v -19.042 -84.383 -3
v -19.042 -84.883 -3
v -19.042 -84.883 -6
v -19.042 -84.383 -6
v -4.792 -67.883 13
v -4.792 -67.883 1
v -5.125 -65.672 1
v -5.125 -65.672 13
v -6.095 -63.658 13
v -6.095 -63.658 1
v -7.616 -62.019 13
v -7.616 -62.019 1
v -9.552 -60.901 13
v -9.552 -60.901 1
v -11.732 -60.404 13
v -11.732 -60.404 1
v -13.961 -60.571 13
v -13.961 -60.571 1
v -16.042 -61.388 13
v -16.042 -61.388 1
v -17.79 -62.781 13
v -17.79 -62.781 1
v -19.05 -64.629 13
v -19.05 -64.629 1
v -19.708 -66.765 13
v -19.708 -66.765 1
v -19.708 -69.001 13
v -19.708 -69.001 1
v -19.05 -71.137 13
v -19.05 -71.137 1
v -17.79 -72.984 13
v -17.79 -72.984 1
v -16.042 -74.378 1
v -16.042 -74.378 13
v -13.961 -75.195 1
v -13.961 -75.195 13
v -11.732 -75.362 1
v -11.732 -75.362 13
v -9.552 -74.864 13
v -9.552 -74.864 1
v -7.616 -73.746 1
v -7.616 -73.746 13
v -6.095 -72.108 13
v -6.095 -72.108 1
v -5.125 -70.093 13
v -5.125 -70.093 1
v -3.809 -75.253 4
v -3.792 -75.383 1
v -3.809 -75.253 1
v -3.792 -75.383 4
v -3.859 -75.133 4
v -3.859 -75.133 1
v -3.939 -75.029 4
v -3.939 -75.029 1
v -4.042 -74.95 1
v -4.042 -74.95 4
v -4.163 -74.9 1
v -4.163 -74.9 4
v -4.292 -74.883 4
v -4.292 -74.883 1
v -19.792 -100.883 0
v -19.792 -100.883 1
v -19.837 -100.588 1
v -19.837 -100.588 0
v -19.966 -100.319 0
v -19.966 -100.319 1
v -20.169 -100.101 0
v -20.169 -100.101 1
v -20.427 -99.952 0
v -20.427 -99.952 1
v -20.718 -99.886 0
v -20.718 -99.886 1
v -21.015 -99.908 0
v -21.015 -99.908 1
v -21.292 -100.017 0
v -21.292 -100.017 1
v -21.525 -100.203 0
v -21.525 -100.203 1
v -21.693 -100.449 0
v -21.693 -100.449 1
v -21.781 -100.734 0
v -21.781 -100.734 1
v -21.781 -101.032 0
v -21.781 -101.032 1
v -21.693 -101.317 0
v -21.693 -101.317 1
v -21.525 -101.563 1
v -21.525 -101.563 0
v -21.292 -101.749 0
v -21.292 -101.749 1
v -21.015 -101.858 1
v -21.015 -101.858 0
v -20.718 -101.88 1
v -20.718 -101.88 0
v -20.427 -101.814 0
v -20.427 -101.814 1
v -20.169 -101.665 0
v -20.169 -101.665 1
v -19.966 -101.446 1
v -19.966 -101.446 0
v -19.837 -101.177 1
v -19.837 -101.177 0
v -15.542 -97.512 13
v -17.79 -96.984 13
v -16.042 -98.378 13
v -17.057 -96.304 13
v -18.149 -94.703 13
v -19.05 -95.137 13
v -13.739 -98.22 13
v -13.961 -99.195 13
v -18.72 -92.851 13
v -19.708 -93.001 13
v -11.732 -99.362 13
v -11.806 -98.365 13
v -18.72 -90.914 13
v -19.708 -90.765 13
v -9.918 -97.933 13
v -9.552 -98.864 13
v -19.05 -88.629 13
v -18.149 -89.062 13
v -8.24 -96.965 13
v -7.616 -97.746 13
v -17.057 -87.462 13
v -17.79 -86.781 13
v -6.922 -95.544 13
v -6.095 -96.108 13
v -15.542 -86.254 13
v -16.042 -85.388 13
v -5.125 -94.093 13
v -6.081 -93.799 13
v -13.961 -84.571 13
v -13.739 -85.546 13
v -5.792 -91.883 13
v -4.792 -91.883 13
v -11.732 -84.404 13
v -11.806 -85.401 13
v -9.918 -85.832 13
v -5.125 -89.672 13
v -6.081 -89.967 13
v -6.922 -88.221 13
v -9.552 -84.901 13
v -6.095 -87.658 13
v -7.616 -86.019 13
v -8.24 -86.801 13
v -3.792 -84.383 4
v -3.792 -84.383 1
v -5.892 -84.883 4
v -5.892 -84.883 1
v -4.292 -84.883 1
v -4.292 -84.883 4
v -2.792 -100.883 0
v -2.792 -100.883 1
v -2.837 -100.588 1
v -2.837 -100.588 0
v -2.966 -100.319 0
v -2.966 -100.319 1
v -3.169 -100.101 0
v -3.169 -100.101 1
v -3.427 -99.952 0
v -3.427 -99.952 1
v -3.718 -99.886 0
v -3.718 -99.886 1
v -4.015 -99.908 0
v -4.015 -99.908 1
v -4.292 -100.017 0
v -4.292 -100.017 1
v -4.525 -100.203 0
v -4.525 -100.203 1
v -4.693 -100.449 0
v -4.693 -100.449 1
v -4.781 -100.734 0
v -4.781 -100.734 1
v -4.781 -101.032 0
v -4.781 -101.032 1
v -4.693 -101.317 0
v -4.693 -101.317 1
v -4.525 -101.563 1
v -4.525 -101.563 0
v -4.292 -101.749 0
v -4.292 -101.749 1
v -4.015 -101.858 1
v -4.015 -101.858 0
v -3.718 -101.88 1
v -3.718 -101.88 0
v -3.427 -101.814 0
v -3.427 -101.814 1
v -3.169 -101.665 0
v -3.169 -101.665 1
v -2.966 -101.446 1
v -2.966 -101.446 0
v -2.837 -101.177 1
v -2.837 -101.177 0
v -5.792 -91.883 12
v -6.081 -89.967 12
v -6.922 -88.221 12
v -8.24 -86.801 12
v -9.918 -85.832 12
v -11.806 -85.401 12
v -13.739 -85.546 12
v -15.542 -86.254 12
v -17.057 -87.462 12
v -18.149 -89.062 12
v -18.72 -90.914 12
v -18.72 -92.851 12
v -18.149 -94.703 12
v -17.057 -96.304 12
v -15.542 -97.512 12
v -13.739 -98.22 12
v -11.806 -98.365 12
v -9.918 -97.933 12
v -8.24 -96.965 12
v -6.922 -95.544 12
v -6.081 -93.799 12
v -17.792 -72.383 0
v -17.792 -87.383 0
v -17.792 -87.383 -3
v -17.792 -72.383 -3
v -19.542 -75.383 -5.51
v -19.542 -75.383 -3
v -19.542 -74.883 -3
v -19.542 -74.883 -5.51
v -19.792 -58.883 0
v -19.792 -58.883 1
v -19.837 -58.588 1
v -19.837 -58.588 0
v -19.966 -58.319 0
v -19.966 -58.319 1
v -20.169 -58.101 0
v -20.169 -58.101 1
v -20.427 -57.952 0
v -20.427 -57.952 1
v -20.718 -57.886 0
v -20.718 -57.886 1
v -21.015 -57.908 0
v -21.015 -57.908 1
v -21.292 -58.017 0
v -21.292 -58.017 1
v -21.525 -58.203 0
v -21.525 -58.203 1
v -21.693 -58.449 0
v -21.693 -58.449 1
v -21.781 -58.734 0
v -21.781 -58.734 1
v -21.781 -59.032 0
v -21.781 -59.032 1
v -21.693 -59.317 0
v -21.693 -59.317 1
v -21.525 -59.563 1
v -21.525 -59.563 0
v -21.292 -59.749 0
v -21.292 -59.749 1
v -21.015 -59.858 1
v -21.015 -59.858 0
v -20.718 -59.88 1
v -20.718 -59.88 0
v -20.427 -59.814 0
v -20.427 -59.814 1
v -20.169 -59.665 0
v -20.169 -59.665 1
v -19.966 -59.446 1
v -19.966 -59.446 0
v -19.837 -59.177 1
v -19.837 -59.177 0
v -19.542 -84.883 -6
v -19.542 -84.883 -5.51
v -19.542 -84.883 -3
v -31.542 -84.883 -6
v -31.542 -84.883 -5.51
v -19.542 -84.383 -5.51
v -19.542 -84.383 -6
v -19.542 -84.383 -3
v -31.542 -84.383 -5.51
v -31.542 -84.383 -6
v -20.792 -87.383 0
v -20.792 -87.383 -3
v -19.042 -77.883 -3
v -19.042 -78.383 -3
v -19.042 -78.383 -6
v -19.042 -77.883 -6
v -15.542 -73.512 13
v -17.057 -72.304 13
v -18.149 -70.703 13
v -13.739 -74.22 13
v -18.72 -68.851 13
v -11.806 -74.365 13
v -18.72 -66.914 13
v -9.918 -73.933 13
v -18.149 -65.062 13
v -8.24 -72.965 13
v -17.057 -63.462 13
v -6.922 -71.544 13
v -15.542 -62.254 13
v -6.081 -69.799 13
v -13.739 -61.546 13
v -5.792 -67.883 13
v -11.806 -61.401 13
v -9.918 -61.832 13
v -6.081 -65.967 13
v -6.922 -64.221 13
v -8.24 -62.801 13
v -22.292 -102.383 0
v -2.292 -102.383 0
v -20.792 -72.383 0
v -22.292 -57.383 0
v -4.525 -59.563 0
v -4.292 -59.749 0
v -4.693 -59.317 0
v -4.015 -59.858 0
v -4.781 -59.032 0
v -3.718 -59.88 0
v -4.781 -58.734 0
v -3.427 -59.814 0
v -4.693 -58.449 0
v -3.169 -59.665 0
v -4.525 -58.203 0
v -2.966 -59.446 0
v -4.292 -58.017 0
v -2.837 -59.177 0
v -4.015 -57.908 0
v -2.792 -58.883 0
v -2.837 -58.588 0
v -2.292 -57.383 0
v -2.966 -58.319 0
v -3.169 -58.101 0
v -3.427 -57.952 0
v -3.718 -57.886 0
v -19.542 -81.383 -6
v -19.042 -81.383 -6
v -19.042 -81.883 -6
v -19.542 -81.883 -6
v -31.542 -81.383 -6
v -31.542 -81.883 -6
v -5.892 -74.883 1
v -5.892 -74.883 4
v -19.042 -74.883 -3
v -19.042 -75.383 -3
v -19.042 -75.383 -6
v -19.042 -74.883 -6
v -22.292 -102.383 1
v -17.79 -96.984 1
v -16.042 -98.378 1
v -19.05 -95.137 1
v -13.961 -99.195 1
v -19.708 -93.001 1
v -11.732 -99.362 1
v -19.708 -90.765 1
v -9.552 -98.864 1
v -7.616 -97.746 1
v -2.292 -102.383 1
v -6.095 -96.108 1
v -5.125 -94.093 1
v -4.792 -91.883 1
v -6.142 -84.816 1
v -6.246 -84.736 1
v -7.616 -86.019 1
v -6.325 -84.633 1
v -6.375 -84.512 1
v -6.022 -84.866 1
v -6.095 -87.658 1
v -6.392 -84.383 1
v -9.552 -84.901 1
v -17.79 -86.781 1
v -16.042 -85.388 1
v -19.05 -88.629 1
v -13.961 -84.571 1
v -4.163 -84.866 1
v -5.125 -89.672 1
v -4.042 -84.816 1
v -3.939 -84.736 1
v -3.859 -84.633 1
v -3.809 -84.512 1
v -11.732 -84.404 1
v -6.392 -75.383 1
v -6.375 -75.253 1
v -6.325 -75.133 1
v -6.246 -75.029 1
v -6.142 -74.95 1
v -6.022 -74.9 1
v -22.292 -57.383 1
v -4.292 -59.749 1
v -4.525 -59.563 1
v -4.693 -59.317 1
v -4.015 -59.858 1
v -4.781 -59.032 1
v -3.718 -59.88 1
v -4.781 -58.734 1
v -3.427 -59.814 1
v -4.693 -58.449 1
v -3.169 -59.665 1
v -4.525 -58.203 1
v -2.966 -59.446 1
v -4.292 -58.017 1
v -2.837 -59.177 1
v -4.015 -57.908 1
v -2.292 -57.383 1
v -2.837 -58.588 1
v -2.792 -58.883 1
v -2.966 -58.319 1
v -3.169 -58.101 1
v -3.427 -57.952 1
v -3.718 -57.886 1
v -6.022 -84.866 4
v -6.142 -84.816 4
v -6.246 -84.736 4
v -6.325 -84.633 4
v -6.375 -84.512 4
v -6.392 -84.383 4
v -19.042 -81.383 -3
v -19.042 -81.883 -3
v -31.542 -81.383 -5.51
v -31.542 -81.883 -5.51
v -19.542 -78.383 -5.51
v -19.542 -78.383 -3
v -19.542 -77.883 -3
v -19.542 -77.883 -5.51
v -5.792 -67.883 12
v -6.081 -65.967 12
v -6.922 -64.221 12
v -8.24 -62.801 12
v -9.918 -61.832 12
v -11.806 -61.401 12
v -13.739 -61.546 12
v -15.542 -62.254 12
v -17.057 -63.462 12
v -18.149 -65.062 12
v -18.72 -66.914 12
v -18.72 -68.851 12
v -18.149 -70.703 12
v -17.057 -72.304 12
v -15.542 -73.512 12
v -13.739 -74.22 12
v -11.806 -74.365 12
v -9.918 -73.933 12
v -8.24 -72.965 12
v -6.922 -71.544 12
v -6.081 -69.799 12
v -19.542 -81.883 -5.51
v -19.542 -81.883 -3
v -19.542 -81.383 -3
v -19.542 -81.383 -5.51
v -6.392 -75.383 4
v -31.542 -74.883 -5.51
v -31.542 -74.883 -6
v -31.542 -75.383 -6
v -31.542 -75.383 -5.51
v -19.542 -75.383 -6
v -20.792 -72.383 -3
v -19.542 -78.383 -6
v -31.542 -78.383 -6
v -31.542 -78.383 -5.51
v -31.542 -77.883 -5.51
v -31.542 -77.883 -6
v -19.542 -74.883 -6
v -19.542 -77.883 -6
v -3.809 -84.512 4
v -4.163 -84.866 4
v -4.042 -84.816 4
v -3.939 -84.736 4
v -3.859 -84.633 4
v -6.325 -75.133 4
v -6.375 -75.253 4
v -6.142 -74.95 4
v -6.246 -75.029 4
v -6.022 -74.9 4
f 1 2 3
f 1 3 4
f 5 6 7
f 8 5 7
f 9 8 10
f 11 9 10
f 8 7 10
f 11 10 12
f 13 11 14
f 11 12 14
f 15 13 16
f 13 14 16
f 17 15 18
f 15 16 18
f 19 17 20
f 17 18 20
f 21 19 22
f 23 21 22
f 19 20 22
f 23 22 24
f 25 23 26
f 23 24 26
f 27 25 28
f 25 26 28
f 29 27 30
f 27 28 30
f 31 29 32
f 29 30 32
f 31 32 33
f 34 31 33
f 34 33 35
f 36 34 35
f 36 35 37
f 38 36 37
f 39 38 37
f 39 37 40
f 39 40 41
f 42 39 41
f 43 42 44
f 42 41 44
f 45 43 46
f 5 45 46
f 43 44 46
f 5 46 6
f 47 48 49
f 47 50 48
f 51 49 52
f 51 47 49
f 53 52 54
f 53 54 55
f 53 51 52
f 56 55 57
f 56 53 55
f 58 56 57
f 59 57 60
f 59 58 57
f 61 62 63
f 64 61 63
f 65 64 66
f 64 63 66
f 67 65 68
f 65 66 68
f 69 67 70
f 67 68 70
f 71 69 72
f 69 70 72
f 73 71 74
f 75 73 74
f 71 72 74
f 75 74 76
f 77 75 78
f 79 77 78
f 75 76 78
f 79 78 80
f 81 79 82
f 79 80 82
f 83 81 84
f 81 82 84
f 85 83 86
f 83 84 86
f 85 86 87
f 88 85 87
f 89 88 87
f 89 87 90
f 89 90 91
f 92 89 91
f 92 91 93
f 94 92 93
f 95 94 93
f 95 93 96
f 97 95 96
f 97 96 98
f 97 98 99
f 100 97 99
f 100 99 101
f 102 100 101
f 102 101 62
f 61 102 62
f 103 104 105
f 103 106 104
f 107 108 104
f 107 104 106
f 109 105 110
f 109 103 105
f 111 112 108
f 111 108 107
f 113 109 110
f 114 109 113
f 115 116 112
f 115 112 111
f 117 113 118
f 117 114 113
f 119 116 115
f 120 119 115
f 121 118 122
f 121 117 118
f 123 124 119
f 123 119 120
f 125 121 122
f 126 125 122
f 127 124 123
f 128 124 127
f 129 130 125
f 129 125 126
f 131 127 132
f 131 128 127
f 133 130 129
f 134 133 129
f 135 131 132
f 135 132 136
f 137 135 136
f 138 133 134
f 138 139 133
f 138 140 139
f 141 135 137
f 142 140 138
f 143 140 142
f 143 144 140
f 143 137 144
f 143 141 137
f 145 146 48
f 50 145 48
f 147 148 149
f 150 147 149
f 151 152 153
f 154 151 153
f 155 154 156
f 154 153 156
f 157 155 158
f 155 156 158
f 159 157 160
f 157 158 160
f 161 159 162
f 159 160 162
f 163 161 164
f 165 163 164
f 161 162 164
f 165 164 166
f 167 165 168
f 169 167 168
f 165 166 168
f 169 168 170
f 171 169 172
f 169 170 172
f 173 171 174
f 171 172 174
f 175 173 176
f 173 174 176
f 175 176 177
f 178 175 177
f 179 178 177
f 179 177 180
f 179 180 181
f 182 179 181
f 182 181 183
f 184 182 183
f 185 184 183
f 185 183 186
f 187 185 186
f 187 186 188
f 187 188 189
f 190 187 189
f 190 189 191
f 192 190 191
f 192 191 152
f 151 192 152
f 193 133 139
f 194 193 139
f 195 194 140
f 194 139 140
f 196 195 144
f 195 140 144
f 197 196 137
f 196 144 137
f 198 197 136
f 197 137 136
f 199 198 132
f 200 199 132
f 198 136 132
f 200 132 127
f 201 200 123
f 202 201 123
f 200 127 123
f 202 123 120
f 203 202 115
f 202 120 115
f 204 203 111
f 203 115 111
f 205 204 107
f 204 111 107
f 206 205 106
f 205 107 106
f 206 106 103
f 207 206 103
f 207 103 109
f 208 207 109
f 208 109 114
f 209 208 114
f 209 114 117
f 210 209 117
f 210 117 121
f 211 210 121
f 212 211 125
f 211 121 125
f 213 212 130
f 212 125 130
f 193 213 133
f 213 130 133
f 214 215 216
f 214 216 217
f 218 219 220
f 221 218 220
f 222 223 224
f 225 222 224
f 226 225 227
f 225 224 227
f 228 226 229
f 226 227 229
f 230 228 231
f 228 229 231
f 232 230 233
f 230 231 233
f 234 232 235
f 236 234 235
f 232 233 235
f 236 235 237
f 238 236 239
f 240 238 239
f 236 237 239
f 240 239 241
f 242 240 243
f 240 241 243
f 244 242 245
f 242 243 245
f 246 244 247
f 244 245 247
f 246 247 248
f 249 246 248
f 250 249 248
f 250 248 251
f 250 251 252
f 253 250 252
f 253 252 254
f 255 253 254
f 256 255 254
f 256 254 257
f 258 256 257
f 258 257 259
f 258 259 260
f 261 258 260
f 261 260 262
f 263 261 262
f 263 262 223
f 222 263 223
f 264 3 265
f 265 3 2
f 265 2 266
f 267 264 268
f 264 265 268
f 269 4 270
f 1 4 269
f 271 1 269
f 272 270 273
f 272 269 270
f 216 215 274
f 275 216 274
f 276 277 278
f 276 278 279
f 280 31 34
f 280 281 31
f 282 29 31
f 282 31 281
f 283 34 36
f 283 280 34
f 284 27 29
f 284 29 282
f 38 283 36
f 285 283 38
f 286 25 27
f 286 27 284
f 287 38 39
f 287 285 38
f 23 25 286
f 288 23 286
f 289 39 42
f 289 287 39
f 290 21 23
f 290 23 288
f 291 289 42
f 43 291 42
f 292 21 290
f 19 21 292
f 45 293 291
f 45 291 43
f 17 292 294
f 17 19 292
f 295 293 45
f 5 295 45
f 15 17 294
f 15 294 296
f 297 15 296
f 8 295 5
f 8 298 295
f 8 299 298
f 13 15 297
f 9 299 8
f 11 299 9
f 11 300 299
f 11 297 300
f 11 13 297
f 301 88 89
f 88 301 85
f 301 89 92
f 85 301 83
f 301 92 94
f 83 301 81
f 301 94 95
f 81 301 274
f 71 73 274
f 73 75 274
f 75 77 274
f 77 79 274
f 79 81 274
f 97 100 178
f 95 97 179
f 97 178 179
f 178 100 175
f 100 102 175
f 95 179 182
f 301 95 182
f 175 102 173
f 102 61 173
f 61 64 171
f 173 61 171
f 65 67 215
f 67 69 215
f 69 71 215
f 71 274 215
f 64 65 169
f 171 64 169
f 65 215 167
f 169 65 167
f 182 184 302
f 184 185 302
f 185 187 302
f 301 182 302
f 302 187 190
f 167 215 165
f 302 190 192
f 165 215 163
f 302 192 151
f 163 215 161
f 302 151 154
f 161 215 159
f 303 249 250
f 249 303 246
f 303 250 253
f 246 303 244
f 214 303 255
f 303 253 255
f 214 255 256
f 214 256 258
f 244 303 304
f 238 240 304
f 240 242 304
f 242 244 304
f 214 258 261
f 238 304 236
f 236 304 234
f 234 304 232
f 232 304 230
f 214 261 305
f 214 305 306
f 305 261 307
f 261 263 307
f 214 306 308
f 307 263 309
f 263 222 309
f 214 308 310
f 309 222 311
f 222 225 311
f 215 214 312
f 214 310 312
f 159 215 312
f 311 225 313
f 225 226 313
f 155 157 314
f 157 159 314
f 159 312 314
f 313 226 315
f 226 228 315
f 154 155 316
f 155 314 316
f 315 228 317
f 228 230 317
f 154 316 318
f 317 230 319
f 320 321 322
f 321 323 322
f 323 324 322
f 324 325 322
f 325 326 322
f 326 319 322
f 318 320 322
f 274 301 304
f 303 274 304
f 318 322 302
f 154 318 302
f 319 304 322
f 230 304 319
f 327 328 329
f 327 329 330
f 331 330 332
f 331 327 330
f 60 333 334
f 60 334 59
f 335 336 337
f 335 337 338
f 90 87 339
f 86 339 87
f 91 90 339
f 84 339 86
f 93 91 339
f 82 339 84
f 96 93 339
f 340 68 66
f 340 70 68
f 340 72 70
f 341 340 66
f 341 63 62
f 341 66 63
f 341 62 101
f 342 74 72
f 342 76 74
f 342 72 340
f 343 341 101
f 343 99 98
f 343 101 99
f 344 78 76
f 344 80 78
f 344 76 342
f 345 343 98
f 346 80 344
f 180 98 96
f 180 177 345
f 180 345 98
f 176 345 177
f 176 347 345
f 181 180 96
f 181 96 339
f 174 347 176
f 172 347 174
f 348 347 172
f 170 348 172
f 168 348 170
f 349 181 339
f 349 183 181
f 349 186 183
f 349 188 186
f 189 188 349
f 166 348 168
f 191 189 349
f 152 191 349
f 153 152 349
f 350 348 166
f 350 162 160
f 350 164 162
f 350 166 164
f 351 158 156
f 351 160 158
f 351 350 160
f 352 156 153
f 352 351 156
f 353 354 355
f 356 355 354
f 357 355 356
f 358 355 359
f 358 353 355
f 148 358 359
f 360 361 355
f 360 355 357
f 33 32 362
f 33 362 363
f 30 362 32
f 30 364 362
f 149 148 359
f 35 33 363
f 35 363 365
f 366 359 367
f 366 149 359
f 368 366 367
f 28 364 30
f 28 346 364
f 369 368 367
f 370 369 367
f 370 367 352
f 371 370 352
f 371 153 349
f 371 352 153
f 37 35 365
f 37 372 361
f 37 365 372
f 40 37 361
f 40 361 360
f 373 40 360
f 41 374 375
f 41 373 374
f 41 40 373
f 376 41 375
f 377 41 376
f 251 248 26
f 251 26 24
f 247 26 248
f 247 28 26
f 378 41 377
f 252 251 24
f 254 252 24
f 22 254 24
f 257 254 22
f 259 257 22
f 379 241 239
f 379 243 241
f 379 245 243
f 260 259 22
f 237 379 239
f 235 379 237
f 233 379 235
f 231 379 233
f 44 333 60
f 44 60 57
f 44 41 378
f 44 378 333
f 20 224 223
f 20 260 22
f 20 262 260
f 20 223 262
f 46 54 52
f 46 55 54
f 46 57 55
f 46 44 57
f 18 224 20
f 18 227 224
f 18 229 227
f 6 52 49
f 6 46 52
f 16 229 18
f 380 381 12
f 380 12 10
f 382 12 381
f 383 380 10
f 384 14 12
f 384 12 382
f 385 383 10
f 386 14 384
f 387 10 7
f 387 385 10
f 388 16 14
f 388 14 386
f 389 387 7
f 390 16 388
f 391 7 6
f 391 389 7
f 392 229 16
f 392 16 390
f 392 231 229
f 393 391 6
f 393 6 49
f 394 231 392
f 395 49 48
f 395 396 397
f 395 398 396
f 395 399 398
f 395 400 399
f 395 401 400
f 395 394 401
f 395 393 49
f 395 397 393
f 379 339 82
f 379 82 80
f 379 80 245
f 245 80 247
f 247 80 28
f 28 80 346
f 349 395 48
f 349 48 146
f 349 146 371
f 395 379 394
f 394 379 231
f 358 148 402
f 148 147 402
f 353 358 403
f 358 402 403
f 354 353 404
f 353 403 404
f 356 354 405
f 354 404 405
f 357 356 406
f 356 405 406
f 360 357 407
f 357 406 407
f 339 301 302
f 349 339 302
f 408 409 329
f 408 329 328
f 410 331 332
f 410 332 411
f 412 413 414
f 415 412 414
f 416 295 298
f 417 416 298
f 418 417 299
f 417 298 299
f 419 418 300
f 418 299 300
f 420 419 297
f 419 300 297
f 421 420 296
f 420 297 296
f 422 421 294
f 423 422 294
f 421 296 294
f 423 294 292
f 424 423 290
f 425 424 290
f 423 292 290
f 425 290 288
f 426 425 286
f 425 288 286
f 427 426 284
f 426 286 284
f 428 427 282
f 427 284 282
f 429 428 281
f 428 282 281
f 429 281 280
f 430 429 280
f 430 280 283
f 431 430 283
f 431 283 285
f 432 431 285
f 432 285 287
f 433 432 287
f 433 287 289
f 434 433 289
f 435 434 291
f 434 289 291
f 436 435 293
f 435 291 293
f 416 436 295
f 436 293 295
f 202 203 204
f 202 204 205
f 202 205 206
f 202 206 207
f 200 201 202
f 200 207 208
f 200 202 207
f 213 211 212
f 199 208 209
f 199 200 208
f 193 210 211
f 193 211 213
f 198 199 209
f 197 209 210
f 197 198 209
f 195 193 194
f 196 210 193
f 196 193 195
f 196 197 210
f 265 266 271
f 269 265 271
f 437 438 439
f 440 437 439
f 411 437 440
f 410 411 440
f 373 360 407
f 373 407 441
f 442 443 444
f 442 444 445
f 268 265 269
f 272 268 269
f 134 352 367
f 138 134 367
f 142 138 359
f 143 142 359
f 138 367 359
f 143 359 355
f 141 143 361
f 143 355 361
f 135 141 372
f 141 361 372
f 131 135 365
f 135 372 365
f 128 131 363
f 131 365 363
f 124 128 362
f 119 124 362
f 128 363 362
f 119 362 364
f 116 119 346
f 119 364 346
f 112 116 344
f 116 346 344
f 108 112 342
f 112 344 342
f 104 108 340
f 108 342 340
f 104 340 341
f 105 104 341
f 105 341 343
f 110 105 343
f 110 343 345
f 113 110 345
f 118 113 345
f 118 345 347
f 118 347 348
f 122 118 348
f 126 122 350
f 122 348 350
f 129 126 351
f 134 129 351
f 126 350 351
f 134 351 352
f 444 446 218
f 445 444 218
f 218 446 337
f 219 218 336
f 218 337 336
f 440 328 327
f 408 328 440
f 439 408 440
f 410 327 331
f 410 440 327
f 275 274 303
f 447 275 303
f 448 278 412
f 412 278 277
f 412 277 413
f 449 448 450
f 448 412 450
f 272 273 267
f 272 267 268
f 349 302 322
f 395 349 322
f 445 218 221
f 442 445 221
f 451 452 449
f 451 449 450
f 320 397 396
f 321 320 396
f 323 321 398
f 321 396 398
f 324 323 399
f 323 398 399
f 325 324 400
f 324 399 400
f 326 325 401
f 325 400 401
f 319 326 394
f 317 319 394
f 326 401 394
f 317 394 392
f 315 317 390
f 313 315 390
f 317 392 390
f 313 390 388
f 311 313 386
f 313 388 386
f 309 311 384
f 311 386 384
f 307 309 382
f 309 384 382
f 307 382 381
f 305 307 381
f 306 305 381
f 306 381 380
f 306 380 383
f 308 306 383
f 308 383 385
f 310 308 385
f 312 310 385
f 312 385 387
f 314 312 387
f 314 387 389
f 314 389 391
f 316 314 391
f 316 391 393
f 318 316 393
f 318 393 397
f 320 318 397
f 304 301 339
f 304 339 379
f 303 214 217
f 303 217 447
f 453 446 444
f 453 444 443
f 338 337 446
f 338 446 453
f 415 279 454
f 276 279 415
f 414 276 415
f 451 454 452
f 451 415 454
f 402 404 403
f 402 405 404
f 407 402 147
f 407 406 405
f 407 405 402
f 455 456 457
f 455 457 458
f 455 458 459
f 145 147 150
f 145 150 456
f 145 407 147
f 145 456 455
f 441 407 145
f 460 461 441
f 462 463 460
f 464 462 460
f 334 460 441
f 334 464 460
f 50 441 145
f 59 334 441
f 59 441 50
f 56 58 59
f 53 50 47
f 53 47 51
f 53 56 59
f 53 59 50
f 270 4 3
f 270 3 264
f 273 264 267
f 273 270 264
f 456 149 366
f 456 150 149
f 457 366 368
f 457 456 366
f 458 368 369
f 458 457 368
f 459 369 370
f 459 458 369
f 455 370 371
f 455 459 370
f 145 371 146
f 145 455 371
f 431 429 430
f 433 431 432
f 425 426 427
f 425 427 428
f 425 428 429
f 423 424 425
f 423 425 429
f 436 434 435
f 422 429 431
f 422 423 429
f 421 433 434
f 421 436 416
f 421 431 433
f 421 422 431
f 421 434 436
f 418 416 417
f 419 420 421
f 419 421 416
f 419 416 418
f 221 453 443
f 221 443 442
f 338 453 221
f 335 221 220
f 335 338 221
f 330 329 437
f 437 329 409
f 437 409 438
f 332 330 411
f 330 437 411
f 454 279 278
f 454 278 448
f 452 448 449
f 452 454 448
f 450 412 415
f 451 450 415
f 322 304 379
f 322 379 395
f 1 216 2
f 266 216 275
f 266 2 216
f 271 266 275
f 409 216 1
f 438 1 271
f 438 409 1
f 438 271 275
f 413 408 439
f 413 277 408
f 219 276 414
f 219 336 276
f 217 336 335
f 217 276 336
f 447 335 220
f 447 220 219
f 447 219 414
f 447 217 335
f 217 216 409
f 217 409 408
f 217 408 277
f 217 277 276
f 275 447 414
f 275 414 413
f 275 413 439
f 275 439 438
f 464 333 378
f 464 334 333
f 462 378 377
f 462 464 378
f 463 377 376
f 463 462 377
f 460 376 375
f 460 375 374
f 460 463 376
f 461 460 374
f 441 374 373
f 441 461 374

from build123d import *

# Parameters (mm, degrees)
SKETCH1_W           = 20
SKETCH1_H           = 45
BOSS_EXTRUDE1_DEPTH = 1
SKETCH2_R           = 7.5
BOSS_EXTRUDE2_DEPTH = 12
SKETCH3_R           = 6.5
CUT_EXTRUDE1_DEPTH  = 1
SKETCH4_W           = 2.6
SKETCH4_H           = 10
BOSS_EXTRUDE3_DEPTH = 3
FILLET1_R           = 0.5
SKETCH5_W           = 3
SKETCH5_H           = 15
BOSS_EXTRUDE4_DEPTH = 3
SKETCH6_W           = 0.5
SKETCH6_H           = 0.5
BOSS_EXTRUDE5_DEPTH = 3
SKETCH7_W           = 0.490041207
SKETCH7_H           = 0.5
BOSS_EXTRUDE6_DEPTH = 12
SKETCH8_R           = 1
CUT_EXTRUDE2_DEPTH  = 3


with BuildPart() as part:
    # Sketch1 → Boss-Extrude1 (new body)
    with BuildSketch(Plane.XY):
        with Locations((-12.292244857, -79.882705913)):
            Rectangle(SKETCH1_W, SKETCH1_H)
    extrude(amount=BOSS_EXTRUDE1_DEPTH)

    # Sketch2 → Boss-Extrude2 (add)
    with BuildSketch(Plane.XY.offset(1)):
        with Locations((-12.292244857, -67.882705913)):
            Circle(SKETCH2_R)
        with Locations((-12.292244857, -91.882705913)):
            Circle(SKETCH2_R)
    extrude(amount=BOSS_EXTRUDE2_DEPTH)

    # Sketch3 → Cut-Extrude1 (cut)
    with BuildSketch(Plane.XY.offset(13)):
        with Locations((-12.292244857, -67.882705913)):
            Circle(SKETCH3_R)
        with Locations((-12.292244857, -91.882705913)):
            Circle(SKETCH3_R)
    extrude(amount=-CUT_EXTRUDE1_DEPTH, mode=Mode.SUBTRACT)

    # Sketch4 → Boss-Extrude3 (add)
    with BuildSketch(Plane.XY.offset(1)):
        with Locations((-5.092244857, -79.882705913)):
            Rectangle(SKETCH4_W, SKETCH4_H)
    extrude(amount=BOSS_EXTRUDE3_DEPTH)

    # Fillet1
    fillet1_edges = [part.edges().sort_by_distance(p)[0] for p in [
        (-6.392244857, -74.882705913, 2.5),
        (-6.392244857, -84.882705913, 2.5),
        (-3.792244857, -84.882705913, 2.5),
        (-3.792244857, -74.882705913, 2.5),
    ]]
    fillet(fillet1_edges, radius=FILLET1_R)

    # Sketch5 → Boss-Extrude4 (add)
    with BuildSketch(Plane(origin=(0, 0, 0), x_dir=(-1, 0, 0), z_dir=(0, 0, -1))):
        with Locations((19.292244857, -79.882705913)):
            Rectangle(SKETCH5_W, SKETCH5_H)
    extrude(amount=BOSS_EXTRUDE4_DEPTH)

    # Sketch6 → Boss-Extrude5 (add)
    with BuildSketch(Plane(origin=(0, 0, -3), x_dir=(-1, 0, 0), z_dir=(0, 0, -1))):
        with Locations((19.292244857, -84.632705913)):
            Rectangle(SKETCH6_W, SKETCH6_H)
        with Locations((19.292244857, -81.632705913)):
            Rectangle(SKETCH6_W, SKETCH6_H)
        with Locations((19.292244857, -78.132705913)):
            Rectangle(SKETCH6_W, SKETCH6_H)
        with Locations((19.292244857, -75.132705913)):
            Rectangle(SKETCH6_W, SKETCH6_H)
    extrude(amount=BOSS_EXTRUDE5_DEPTH)

    # Sketch7 → Boss-Extrude6 (add)
    with BuildSketch(Plane.ZY.offset(19.542244857)):
        with Locations((-5.754979396, -75.132705913)):
            Rectangle(SKETCH7_W, SKETCH7_H)
        with Locations((-5.754979396, -78.132705913)):
            Rectangle(SKETCH7_W, SKETCH7_H)
        with Locations((-5.754979396, -81.632705913)):
            Rectangle(SKETCH7_W, SKETCH7_H)
        with Locations((-5.754979396, -84.632705913)):
            Rectangle(SKETCH7_W, SKETCH7_H)
    extrude(amount=BOSS_EXTRUDE6_DEPTH)

    # Sketch8 → Cut-Extrude2 (cut)
    with BuildSketch(Plane.XY.offset(1)):
        with Locations((-20.792244857, -58.882705913)):
            Circle(SKETCH8_R)
        with Locations((-3.792244857, -58.882705913)):
            Circle(SKETCH8_R)
        with Locations((-3.792244857, -100.882705913)):
            Circle(SKETCH8_R)
        with Locations((-20.792244857, -100.882705913)):
            Circle(SKETCH8_R)
    extrude(amount=-CUT_EXTRUDE2_DEPTH, mode=Mode.SUBTRACT)


solid = part.part
